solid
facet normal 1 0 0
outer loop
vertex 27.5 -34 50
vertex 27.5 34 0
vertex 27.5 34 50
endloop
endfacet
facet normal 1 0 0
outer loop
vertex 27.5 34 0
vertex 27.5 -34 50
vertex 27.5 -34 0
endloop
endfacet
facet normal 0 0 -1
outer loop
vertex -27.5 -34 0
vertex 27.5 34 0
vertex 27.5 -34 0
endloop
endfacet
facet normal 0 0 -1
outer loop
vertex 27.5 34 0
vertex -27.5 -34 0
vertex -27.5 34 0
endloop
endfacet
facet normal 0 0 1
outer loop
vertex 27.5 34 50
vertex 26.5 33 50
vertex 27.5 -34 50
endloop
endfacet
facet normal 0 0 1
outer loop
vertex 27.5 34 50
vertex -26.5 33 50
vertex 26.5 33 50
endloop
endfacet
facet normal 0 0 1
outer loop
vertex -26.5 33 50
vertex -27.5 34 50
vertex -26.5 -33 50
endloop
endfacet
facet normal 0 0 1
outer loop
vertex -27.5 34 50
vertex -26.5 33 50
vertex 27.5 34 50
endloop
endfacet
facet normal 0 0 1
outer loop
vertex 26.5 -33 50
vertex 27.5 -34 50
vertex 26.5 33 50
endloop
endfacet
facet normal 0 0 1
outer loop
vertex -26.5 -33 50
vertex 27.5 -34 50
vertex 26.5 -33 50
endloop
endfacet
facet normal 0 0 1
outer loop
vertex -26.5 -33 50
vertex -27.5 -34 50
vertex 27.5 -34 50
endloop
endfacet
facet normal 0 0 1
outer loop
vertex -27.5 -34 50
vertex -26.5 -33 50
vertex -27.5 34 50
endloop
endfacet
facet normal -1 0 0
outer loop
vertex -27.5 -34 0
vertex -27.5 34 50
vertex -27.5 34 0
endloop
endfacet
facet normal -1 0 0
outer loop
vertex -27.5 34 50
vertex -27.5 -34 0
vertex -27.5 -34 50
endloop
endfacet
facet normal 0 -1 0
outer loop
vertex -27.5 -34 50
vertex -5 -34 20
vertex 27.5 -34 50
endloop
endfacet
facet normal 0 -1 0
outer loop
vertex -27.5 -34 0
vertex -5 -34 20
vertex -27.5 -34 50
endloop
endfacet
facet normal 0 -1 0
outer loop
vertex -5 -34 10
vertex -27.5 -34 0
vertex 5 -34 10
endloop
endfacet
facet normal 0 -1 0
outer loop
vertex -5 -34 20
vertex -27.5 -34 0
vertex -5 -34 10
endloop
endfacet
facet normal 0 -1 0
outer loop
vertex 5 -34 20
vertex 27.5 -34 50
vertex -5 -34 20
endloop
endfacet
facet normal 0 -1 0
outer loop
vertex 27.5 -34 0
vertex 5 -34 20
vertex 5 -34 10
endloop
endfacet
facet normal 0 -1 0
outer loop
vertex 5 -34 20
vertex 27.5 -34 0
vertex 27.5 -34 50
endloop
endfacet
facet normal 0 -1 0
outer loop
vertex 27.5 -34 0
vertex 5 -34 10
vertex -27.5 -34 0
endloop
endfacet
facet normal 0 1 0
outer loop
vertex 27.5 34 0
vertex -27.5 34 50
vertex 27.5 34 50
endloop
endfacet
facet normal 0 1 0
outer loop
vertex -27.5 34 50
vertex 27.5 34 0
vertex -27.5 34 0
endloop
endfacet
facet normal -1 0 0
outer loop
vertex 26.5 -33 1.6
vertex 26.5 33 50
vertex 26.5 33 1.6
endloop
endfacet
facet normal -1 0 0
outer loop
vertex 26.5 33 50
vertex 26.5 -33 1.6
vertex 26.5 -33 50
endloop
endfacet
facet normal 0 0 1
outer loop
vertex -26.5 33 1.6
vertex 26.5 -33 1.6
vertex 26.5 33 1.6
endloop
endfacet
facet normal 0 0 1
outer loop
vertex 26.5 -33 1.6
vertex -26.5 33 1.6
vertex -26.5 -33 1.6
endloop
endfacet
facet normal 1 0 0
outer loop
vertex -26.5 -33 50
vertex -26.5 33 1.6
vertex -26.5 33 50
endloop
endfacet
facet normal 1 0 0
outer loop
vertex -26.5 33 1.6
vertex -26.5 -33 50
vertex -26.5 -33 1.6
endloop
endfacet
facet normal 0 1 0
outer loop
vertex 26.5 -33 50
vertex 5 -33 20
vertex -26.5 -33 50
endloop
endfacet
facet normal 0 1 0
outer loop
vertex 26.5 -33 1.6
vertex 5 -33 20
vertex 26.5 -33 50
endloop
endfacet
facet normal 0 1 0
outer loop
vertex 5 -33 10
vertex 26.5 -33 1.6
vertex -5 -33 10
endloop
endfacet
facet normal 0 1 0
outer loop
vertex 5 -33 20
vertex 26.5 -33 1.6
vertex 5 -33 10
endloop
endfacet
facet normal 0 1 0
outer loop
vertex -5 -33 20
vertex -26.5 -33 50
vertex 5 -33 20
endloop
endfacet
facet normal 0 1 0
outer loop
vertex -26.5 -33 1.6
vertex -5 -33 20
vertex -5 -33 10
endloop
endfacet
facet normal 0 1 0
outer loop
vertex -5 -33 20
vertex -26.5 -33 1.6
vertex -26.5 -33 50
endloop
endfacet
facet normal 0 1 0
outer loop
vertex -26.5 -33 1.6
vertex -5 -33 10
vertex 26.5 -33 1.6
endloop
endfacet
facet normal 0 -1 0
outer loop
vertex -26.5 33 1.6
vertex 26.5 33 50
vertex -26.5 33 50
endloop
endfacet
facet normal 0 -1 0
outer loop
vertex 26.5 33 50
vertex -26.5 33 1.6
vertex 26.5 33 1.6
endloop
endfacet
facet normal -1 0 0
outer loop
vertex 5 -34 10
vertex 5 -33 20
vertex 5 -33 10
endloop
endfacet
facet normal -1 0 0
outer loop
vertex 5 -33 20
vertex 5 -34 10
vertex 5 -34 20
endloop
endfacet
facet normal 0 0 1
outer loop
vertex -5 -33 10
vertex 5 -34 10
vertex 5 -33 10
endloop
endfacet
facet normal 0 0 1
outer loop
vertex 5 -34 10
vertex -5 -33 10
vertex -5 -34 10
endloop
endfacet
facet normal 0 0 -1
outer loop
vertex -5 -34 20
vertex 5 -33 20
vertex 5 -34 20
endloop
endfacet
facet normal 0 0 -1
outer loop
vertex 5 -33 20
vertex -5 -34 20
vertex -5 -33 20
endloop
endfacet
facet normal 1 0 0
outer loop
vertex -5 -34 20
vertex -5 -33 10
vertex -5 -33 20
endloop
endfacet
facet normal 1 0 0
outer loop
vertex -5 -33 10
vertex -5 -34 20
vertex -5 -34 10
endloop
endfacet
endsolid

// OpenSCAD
// Rectangular, flat-top alternative to the original MicroHuli cover.
// Millimetres. Rear is +Y; assembled bottom is Z=0.
width = 55;
depth = 68;
height = 50;
wall = 1.0;
top_thickness = 1.6;
usb_width = 10;
usb_height = 10;
usb_top_offset = 10; // Outside top to upper edge of opening.
print_orientation = true; // Closed top on the bed; no internal supports.

assert(width > 2 * wall && depth > 2 * wall);
assert(height > top_thickness && wall > 0 && top_thickness > 0);
assert(usb_width < width - 2 * wall);
assert(usb_top_offset > top_thickness);
assert(usb_top_offset + usb_height < height);

module body() {
    difference() {
        translate([-width / 2, -depth / 2, 0])
            cube([width, depth, height]);
        // Open bottom, preserving the original nominal 53 x 66 mm cavity.
        translate([-width / 2 + wall, -depth / 2 + wall, -1])
            cube([width - 2 * wall, depth - 2 * wall,
                  height - top_thickness + 1]);
        // Square opening centered on the rear wall.
        translate([-usb_width / 2, depth / 2 - wall - 1,
                   height - usb_top_offset - usb_height])
            cube([usb_width, wall + 2, usb_height]);
    }
}

if (print_orientation)
    translate([0, 0, height]) rotate([180, 0, 0]) body();
else
    body();
